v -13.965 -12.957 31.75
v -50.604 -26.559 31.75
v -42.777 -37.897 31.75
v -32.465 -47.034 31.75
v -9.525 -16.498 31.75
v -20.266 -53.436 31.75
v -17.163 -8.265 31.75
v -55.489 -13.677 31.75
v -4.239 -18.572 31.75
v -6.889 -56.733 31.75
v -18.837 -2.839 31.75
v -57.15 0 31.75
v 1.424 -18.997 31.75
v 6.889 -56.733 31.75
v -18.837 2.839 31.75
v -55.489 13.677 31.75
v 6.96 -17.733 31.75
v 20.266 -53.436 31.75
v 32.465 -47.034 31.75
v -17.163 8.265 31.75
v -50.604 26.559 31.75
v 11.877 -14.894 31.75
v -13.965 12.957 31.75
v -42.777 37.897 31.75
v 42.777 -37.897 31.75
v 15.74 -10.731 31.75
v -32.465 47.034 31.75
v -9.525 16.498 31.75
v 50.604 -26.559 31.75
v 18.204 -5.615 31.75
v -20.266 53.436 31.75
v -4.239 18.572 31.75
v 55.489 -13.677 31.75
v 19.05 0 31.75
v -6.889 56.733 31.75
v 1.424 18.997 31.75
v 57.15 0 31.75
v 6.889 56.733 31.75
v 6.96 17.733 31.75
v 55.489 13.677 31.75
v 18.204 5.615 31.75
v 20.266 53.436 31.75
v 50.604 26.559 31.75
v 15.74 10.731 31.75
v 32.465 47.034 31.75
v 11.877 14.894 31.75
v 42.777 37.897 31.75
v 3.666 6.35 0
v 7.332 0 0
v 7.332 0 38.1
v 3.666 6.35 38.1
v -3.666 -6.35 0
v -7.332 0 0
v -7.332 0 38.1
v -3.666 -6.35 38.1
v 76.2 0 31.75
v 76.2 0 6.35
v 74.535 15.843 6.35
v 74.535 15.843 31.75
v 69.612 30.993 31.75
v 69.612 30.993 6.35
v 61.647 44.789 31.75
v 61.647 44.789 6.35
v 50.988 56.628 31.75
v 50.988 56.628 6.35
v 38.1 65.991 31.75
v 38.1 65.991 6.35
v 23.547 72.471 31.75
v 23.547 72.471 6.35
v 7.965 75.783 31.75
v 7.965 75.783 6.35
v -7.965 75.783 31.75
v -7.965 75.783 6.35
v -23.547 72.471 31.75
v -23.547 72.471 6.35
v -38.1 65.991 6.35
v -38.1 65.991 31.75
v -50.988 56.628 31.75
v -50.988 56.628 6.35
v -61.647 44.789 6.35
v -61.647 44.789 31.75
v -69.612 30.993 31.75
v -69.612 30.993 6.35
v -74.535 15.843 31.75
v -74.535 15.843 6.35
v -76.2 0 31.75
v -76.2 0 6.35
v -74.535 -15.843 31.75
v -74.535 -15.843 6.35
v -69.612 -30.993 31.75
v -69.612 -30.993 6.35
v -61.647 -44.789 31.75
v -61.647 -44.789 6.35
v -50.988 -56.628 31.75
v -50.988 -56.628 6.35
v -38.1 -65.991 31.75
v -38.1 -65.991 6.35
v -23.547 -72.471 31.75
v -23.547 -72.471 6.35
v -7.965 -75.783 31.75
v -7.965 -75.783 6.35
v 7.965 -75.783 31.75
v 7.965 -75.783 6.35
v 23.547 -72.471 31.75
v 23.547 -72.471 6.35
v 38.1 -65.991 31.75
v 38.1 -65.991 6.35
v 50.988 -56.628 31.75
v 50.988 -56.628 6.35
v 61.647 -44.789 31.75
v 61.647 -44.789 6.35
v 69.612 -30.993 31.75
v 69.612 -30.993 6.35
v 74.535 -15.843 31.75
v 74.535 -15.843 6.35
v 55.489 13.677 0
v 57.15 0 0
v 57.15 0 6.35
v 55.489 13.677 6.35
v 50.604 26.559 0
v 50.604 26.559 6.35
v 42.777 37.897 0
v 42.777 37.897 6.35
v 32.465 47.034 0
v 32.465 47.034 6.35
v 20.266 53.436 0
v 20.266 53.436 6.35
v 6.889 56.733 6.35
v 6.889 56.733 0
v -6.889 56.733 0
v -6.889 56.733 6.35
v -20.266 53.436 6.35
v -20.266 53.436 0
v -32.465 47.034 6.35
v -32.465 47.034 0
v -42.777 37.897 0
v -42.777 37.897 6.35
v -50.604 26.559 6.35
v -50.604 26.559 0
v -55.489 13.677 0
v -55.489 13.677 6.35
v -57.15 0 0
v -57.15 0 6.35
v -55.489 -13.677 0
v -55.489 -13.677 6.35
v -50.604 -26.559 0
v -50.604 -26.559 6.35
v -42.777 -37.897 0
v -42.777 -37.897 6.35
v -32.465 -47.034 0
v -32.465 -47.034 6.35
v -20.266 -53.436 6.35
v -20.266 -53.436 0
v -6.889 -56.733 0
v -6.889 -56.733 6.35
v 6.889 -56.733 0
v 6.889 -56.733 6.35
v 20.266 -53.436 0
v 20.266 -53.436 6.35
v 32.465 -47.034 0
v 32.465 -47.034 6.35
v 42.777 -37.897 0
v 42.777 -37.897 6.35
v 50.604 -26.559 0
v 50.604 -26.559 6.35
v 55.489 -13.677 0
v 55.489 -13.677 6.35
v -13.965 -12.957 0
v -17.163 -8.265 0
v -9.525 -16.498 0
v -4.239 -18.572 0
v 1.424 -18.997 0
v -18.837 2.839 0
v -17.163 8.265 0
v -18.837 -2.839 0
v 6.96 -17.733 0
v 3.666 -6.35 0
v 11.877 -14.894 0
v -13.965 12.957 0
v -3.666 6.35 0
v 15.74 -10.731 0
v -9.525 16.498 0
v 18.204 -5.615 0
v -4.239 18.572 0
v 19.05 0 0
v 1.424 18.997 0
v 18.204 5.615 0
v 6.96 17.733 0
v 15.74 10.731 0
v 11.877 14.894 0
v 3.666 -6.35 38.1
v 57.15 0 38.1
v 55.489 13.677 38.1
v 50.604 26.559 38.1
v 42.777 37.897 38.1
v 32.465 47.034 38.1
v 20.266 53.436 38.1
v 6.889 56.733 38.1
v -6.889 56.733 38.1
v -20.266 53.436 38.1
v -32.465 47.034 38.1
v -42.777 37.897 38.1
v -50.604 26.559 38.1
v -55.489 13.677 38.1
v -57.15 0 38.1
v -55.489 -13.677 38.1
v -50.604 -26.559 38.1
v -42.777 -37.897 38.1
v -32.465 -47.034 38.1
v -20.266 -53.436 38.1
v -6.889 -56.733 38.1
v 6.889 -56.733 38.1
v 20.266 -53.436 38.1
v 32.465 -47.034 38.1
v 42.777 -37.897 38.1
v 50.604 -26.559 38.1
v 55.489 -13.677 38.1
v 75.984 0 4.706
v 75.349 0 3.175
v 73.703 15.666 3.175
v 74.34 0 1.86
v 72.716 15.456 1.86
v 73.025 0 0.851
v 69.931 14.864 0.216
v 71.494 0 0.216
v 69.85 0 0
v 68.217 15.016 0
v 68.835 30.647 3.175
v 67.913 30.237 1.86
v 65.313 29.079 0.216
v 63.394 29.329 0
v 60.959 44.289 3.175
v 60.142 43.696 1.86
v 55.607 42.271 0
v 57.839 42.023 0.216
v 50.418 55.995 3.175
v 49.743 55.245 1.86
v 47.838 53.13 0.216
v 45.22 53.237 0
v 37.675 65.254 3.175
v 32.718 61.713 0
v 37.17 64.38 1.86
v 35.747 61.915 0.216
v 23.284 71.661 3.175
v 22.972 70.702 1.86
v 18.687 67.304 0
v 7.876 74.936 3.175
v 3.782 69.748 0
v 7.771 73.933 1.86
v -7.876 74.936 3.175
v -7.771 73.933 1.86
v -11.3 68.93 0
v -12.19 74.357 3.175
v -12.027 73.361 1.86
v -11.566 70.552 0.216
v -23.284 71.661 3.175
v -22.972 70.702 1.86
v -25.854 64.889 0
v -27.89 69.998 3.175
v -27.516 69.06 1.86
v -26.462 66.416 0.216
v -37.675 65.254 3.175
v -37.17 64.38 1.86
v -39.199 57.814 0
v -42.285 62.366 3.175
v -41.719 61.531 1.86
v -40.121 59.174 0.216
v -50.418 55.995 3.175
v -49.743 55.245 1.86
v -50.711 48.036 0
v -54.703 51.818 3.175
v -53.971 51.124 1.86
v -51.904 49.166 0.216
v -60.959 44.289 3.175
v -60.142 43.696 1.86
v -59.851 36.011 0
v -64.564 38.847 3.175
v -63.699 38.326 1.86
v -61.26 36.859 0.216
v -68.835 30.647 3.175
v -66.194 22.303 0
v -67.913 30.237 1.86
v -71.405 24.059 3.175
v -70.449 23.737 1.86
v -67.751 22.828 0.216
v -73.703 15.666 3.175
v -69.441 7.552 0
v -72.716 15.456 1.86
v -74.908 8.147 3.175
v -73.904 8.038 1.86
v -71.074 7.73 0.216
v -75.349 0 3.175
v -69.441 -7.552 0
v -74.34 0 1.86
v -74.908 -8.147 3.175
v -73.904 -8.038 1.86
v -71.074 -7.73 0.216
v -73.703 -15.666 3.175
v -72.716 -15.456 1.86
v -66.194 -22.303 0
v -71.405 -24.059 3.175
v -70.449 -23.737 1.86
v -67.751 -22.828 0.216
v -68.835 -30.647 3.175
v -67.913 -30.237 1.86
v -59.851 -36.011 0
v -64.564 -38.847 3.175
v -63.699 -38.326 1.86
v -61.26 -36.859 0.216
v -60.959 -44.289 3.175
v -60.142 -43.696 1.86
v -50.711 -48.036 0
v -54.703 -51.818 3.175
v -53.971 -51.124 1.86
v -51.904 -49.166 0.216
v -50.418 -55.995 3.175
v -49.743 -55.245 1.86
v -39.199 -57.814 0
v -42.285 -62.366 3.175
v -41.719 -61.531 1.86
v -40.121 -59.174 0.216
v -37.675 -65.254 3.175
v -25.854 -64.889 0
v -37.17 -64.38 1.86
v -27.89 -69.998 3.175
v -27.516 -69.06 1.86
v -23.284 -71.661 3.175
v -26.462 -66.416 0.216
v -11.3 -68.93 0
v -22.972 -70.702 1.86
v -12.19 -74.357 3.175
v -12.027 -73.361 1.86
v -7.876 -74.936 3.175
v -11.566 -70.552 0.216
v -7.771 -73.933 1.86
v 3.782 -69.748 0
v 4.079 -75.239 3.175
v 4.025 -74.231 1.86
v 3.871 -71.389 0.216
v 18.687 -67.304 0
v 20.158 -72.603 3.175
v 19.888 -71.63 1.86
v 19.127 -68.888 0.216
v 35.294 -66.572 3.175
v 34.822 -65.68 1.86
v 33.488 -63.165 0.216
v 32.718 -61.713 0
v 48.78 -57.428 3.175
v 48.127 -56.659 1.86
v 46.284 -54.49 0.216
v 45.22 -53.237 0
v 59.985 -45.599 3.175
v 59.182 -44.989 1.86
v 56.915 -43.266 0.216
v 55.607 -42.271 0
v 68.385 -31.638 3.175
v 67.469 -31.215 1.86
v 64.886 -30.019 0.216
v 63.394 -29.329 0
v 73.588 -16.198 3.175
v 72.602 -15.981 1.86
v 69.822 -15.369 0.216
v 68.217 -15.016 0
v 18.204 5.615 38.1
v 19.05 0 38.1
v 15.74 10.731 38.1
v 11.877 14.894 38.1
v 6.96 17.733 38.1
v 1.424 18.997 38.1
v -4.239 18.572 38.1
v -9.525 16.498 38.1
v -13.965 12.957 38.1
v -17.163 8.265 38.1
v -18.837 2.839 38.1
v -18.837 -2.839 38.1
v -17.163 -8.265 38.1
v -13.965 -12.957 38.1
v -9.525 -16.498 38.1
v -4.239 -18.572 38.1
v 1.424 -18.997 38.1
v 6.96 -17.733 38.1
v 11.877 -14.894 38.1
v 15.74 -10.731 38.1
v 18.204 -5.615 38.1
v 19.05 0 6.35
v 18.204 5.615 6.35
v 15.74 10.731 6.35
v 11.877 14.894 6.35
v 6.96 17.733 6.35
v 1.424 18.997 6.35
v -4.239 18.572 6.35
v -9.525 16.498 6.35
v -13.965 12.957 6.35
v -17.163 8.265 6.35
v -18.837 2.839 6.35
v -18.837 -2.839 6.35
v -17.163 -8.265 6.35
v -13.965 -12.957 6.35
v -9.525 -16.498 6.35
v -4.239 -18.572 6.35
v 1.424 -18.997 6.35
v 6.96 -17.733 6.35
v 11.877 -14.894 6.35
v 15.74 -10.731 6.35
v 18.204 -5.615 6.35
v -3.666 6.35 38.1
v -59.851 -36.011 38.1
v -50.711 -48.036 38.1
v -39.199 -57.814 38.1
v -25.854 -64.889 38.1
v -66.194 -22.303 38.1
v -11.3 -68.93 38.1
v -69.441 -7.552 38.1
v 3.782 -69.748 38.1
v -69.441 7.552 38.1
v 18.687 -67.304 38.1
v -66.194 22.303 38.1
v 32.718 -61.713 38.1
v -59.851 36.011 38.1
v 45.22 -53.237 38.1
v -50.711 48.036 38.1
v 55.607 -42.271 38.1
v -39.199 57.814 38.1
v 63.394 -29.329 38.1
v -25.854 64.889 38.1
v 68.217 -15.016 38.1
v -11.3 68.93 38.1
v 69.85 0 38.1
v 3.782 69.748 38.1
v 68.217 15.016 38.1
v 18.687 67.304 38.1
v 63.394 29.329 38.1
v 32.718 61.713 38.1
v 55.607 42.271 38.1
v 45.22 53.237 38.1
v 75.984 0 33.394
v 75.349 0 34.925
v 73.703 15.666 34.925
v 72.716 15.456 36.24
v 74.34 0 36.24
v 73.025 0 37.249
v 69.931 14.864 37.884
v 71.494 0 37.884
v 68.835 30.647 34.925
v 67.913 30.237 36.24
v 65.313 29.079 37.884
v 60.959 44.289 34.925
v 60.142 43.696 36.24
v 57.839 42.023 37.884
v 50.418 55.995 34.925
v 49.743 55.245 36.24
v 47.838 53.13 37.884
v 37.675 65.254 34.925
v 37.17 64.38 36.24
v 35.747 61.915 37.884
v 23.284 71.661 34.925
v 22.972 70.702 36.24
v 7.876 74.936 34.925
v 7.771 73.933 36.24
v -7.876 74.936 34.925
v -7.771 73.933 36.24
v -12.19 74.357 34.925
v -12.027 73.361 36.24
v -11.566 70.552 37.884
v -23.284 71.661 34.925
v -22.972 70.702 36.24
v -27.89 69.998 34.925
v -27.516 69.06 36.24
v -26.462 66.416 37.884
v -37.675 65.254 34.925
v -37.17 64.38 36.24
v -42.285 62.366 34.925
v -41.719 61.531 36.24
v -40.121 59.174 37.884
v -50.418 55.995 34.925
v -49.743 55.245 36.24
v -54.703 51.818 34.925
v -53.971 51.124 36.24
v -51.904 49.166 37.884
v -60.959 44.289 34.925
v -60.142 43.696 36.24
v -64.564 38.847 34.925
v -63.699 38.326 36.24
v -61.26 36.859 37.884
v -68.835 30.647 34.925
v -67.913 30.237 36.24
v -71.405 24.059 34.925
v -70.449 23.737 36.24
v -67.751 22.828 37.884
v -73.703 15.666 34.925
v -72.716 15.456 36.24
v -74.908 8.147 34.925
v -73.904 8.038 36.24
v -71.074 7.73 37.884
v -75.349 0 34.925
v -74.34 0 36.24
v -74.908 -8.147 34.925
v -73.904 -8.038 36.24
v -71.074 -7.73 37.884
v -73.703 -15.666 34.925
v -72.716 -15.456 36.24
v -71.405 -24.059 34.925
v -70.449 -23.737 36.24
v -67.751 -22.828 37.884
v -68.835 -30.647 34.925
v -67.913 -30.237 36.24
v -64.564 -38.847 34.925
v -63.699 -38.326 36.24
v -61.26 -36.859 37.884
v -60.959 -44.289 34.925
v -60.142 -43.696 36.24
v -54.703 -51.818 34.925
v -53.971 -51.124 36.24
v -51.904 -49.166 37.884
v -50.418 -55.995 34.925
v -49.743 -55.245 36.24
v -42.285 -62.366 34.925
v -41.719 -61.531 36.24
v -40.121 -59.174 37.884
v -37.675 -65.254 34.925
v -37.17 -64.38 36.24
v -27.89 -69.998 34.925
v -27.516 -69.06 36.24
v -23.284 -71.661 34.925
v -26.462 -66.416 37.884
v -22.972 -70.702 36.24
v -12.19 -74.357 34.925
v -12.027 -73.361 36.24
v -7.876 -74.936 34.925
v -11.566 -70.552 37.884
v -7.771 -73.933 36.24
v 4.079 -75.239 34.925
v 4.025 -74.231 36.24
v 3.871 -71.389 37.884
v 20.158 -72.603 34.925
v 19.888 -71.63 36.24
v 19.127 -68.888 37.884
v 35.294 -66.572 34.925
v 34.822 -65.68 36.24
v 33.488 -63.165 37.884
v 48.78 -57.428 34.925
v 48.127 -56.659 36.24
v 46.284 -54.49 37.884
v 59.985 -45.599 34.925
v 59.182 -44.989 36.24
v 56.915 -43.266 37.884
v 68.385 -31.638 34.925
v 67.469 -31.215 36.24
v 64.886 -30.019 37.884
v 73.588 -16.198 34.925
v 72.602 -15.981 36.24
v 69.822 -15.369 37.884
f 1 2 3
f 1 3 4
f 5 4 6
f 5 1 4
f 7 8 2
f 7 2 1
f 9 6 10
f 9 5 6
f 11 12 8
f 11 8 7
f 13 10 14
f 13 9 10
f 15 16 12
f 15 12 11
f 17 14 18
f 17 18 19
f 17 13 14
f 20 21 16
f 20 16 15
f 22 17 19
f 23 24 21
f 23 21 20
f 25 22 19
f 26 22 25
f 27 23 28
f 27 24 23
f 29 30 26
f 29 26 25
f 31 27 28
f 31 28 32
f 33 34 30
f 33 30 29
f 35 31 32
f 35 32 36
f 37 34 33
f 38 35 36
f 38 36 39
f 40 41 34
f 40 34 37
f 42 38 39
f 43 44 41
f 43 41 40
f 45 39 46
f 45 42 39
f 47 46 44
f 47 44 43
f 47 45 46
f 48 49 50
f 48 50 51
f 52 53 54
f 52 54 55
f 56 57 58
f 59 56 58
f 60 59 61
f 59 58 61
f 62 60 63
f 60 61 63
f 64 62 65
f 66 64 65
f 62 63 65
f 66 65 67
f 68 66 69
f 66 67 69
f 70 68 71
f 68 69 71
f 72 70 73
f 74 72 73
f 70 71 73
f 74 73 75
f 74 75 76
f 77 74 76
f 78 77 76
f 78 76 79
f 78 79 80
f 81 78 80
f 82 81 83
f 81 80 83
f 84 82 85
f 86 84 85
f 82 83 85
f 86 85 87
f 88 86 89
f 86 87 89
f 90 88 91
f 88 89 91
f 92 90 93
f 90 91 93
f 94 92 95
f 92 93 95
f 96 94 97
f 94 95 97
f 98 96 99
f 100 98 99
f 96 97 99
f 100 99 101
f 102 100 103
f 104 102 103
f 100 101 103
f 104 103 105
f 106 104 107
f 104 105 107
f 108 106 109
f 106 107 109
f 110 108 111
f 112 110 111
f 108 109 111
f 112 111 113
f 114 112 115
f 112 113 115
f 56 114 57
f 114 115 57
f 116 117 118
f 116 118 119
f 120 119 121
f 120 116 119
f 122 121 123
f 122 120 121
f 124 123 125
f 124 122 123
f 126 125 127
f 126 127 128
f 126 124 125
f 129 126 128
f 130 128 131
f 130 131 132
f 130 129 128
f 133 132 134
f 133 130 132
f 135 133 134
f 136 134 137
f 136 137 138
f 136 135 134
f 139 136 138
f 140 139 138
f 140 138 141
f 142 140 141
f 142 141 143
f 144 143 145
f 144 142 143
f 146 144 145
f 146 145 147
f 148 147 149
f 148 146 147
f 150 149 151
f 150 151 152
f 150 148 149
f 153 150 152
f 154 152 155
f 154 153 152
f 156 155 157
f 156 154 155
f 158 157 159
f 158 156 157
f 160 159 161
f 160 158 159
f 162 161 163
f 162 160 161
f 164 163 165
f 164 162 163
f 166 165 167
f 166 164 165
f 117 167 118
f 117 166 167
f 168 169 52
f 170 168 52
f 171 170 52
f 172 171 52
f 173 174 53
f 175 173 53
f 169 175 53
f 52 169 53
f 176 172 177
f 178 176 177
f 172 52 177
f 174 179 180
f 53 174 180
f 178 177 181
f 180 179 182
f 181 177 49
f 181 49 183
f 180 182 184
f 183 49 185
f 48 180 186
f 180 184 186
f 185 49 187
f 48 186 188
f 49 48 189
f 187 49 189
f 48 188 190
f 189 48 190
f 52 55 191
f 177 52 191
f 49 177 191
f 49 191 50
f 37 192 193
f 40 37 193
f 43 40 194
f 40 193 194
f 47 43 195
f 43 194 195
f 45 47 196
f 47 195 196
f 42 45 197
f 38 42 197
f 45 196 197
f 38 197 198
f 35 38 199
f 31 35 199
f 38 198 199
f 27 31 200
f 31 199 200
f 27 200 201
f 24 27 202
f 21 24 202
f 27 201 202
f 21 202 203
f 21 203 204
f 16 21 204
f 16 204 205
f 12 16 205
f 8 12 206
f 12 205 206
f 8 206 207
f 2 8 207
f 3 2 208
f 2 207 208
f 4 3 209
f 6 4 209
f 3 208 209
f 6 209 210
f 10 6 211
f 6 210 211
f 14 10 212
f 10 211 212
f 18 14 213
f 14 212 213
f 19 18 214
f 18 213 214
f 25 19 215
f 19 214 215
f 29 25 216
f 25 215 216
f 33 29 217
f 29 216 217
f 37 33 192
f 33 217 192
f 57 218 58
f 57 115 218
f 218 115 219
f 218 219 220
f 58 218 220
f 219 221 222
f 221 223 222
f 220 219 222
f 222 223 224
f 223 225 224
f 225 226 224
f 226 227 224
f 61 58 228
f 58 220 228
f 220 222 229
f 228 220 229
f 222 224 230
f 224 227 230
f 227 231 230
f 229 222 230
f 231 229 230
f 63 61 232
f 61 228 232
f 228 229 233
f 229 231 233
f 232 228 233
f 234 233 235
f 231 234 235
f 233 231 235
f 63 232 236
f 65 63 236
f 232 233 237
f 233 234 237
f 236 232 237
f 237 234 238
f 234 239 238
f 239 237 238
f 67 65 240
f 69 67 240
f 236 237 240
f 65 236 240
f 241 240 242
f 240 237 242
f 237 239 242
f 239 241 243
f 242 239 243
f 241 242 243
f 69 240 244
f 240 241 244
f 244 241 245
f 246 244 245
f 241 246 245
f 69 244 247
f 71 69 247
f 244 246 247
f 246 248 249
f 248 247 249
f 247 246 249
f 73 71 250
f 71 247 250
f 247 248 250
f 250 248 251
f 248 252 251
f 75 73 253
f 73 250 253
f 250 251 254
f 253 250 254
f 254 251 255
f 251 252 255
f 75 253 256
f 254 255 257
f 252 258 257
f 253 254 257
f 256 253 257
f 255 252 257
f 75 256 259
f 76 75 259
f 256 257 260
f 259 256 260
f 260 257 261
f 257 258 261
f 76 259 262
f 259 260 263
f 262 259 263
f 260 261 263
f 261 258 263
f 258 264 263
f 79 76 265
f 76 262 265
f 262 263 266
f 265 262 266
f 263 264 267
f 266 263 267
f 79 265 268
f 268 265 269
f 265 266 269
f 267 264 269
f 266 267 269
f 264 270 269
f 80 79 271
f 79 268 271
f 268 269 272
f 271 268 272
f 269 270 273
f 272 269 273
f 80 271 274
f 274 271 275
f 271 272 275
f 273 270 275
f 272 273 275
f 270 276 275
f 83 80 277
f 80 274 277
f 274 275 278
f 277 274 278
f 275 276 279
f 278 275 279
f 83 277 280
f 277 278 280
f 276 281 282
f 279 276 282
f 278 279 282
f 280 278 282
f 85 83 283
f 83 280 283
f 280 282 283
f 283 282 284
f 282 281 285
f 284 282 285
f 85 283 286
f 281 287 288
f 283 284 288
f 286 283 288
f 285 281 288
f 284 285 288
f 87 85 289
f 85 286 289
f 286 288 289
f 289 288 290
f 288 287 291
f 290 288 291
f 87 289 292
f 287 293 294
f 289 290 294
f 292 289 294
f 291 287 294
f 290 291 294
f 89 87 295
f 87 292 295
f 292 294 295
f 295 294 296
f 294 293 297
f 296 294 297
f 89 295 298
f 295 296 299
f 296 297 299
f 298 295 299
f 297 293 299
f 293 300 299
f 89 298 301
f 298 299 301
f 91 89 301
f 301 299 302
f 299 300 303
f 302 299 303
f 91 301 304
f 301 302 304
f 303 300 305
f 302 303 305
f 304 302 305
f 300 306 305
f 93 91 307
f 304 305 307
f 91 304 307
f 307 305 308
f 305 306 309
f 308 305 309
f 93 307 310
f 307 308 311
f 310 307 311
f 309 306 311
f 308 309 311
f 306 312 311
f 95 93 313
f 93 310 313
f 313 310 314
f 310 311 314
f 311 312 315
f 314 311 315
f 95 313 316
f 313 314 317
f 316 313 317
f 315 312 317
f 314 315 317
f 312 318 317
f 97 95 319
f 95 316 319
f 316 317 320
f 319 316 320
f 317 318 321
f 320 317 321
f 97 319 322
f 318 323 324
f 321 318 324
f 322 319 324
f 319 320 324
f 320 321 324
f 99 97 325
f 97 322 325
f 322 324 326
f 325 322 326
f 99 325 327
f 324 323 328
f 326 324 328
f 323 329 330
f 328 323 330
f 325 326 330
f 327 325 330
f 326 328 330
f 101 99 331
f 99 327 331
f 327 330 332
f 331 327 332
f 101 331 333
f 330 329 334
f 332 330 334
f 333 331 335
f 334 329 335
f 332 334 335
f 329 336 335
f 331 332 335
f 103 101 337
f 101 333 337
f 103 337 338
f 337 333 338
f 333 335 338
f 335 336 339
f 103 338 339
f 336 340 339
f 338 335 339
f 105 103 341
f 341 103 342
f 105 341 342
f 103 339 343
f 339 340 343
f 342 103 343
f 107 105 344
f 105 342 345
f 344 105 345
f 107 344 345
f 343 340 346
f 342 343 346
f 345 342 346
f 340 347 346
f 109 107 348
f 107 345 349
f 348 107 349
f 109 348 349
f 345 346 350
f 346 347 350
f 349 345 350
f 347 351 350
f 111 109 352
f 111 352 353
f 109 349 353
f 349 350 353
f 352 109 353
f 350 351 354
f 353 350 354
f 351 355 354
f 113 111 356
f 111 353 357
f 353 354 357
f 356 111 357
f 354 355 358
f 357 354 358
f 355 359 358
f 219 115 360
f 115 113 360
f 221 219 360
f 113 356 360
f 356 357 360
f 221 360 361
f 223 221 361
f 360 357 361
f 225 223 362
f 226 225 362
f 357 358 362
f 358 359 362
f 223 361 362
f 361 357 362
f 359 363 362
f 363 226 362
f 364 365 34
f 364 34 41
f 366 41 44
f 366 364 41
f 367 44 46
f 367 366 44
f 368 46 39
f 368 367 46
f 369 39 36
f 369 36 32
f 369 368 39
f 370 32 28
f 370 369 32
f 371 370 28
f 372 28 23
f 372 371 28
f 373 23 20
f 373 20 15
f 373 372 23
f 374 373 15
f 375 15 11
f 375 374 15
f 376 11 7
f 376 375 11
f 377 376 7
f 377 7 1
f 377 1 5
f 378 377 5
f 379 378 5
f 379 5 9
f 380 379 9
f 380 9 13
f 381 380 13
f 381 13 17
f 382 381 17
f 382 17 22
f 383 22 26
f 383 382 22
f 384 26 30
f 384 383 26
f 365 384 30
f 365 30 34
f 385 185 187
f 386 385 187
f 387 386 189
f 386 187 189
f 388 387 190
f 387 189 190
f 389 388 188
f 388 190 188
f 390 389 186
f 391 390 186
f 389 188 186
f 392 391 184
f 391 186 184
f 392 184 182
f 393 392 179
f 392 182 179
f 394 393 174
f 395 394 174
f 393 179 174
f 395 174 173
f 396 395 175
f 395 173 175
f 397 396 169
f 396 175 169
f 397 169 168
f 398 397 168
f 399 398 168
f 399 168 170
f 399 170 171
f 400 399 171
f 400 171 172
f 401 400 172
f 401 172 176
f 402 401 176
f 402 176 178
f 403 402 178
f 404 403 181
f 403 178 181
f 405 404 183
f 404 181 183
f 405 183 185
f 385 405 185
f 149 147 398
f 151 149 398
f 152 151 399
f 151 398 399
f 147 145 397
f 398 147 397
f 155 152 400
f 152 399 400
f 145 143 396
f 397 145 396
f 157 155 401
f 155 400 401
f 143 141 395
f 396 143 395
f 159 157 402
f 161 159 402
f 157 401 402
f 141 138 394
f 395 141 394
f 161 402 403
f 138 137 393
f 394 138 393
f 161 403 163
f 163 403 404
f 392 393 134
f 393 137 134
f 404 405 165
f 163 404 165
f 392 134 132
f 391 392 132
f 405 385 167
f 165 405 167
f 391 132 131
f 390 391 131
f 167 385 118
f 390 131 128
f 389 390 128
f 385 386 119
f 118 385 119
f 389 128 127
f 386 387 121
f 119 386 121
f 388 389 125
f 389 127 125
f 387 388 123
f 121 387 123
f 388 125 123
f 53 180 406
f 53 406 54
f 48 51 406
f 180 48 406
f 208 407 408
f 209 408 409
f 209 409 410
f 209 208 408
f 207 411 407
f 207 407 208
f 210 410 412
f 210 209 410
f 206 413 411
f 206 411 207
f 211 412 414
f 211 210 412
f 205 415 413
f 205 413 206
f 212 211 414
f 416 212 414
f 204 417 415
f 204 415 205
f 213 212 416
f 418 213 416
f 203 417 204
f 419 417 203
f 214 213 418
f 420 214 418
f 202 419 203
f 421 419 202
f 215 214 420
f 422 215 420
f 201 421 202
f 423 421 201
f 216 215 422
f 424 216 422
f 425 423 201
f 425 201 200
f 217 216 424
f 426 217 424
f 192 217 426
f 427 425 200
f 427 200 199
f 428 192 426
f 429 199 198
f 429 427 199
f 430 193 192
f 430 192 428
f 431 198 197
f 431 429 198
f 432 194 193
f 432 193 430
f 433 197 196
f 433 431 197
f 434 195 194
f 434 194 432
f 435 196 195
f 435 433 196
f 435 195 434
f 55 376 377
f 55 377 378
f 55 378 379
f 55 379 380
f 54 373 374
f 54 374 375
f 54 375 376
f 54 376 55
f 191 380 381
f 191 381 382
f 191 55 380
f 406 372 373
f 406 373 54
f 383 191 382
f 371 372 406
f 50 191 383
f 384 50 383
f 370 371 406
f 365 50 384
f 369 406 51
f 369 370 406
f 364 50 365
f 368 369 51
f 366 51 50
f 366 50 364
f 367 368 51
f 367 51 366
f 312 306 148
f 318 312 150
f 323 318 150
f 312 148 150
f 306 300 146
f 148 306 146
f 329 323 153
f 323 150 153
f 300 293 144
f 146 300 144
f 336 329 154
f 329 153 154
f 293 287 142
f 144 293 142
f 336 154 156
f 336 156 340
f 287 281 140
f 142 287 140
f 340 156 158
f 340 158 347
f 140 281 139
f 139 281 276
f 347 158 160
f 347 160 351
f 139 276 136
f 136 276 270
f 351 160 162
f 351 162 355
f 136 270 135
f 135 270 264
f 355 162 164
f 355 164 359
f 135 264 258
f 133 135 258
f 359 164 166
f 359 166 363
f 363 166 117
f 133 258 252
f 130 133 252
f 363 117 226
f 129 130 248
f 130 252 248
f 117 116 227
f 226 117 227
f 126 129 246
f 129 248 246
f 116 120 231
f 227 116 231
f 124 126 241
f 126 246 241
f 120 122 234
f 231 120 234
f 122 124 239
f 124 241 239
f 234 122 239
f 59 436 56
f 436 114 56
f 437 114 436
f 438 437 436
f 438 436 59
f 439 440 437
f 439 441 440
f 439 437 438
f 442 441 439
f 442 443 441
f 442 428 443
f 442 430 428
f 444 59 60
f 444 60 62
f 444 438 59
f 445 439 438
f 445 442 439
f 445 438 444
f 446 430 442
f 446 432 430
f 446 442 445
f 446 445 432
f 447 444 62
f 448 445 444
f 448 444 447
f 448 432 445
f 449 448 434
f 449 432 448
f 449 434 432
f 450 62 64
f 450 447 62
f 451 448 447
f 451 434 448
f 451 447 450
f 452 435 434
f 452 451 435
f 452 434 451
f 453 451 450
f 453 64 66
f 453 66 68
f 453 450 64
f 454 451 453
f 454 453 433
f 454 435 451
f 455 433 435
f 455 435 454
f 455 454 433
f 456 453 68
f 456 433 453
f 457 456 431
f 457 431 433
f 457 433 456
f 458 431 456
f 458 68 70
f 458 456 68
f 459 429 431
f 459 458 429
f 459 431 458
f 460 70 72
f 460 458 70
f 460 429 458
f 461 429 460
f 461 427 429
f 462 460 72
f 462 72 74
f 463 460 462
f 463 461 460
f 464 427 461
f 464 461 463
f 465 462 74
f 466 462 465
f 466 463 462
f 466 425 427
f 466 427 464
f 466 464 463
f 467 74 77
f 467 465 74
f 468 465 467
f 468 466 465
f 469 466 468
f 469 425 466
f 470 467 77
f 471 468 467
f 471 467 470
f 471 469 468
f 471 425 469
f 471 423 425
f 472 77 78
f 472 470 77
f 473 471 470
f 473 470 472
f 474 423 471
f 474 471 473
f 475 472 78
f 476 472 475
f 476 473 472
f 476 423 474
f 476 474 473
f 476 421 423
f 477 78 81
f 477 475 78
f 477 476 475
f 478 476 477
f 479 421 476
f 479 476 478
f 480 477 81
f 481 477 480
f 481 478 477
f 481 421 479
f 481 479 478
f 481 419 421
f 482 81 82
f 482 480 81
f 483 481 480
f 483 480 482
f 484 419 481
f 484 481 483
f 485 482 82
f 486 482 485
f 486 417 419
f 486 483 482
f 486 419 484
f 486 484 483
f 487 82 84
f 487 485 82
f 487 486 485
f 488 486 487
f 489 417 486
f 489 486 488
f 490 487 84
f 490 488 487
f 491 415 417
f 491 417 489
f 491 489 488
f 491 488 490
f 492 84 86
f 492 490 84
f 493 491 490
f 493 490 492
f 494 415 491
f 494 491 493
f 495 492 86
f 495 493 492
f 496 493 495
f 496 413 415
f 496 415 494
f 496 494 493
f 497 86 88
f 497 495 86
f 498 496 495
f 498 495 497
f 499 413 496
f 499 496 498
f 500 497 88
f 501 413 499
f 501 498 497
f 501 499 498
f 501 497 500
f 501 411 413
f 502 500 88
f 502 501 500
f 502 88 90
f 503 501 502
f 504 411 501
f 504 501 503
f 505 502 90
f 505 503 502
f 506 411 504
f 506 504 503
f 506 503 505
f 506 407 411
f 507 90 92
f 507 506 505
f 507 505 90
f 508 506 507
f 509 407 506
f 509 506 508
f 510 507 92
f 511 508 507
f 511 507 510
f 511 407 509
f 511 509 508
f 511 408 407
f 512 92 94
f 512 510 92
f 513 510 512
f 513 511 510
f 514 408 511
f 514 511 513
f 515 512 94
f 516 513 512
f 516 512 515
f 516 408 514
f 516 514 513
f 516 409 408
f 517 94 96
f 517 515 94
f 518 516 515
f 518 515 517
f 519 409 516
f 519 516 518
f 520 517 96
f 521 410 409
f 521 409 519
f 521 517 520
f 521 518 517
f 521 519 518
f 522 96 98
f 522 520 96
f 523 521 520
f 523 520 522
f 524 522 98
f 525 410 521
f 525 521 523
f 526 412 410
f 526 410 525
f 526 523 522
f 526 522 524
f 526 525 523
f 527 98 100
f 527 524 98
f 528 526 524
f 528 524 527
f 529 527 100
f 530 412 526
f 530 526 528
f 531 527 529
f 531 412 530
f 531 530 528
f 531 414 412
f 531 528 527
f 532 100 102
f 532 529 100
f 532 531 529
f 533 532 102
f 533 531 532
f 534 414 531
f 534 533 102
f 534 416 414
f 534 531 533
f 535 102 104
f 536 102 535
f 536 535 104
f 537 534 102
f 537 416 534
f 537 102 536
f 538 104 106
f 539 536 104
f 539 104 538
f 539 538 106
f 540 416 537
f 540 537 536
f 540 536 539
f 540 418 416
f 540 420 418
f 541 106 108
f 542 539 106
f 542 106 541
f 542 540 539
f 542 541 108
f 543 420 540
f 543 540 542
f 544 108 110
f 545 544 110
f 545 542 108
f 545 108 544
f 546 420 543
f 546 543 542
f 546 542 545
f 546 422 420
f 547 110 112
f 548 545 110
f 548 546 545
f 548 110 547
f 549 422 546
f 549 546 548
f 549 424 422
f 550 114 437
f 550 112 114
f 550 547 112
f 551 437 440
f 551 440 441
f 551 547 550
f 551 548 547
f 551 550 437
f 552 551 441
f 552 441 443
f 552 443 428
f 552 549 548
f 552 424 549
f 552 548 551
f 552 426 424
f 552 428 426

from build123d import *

# Parameters (mm, degrees)
SKETCH1_R           = 76.2
BOSS_EXTRUDE1_DEPTH = 38.1
FILLET1_R           = 6.35
CUT_EXTRUDE2_DEPTH  = 39.1
SKETCH3_R           = 57.15
SKETCH3_R_2         = 19.05
CUT_EXTRUDE3_DEPTH  = 6.35


with BuildPart() as part:
    # Sketch1 → Boss-Extrude1 (new body)
    with BuildSketch(Plane.XY):
        Circle(SKETCH1_R)
    extrude(amount=BOSS_EXTRUDE1_DEPTH)

    # Fillet1
    fillet1_edges = [part.edges().sort_by_distance(p)[0] for p in [
        (-76.2, 0, 0),
        (-76.2, 0, 38.1),
    ]]
    fillet(fillet1_edges, radius=FILLET1_R)

    # Sketch2 → Cut-Extrude2 (cut, through all)
    with BuildSketch(Plane.XY.offset(38.1)):
        Polygon((7.332348419, 0), (3.666174209, 6.35), (-3.666174209, 6.35), (-7.332348419, 0), (-3.666174209, -6.35), (3.666174209, -6.35), align=None)
    extrude(amount=-CUT_EXTRUDE2_DEPTH, mode=Mode.SUBTRACT)

    # Sketch3 → Cut-Extrude3 (cut)
    with BuildSketch(Plane.XY.offset(38.1)):
        Circle(SKETCH3_R)
        Circle(SKETCH3_R_2, mode=Mode.SUBTRACT)
    cut_extrude3 = extrude(amount=-CUT_EXTRUDE3_DEPTH, mode=Mode.SUBTRACT)

    # Mirror1: Cut-Extrude3 across plane
    add(cut_extrude3.mirror(Plane.XY.offset(19.05)), mode=Mode.SUBTRACT)


solid = part.part
